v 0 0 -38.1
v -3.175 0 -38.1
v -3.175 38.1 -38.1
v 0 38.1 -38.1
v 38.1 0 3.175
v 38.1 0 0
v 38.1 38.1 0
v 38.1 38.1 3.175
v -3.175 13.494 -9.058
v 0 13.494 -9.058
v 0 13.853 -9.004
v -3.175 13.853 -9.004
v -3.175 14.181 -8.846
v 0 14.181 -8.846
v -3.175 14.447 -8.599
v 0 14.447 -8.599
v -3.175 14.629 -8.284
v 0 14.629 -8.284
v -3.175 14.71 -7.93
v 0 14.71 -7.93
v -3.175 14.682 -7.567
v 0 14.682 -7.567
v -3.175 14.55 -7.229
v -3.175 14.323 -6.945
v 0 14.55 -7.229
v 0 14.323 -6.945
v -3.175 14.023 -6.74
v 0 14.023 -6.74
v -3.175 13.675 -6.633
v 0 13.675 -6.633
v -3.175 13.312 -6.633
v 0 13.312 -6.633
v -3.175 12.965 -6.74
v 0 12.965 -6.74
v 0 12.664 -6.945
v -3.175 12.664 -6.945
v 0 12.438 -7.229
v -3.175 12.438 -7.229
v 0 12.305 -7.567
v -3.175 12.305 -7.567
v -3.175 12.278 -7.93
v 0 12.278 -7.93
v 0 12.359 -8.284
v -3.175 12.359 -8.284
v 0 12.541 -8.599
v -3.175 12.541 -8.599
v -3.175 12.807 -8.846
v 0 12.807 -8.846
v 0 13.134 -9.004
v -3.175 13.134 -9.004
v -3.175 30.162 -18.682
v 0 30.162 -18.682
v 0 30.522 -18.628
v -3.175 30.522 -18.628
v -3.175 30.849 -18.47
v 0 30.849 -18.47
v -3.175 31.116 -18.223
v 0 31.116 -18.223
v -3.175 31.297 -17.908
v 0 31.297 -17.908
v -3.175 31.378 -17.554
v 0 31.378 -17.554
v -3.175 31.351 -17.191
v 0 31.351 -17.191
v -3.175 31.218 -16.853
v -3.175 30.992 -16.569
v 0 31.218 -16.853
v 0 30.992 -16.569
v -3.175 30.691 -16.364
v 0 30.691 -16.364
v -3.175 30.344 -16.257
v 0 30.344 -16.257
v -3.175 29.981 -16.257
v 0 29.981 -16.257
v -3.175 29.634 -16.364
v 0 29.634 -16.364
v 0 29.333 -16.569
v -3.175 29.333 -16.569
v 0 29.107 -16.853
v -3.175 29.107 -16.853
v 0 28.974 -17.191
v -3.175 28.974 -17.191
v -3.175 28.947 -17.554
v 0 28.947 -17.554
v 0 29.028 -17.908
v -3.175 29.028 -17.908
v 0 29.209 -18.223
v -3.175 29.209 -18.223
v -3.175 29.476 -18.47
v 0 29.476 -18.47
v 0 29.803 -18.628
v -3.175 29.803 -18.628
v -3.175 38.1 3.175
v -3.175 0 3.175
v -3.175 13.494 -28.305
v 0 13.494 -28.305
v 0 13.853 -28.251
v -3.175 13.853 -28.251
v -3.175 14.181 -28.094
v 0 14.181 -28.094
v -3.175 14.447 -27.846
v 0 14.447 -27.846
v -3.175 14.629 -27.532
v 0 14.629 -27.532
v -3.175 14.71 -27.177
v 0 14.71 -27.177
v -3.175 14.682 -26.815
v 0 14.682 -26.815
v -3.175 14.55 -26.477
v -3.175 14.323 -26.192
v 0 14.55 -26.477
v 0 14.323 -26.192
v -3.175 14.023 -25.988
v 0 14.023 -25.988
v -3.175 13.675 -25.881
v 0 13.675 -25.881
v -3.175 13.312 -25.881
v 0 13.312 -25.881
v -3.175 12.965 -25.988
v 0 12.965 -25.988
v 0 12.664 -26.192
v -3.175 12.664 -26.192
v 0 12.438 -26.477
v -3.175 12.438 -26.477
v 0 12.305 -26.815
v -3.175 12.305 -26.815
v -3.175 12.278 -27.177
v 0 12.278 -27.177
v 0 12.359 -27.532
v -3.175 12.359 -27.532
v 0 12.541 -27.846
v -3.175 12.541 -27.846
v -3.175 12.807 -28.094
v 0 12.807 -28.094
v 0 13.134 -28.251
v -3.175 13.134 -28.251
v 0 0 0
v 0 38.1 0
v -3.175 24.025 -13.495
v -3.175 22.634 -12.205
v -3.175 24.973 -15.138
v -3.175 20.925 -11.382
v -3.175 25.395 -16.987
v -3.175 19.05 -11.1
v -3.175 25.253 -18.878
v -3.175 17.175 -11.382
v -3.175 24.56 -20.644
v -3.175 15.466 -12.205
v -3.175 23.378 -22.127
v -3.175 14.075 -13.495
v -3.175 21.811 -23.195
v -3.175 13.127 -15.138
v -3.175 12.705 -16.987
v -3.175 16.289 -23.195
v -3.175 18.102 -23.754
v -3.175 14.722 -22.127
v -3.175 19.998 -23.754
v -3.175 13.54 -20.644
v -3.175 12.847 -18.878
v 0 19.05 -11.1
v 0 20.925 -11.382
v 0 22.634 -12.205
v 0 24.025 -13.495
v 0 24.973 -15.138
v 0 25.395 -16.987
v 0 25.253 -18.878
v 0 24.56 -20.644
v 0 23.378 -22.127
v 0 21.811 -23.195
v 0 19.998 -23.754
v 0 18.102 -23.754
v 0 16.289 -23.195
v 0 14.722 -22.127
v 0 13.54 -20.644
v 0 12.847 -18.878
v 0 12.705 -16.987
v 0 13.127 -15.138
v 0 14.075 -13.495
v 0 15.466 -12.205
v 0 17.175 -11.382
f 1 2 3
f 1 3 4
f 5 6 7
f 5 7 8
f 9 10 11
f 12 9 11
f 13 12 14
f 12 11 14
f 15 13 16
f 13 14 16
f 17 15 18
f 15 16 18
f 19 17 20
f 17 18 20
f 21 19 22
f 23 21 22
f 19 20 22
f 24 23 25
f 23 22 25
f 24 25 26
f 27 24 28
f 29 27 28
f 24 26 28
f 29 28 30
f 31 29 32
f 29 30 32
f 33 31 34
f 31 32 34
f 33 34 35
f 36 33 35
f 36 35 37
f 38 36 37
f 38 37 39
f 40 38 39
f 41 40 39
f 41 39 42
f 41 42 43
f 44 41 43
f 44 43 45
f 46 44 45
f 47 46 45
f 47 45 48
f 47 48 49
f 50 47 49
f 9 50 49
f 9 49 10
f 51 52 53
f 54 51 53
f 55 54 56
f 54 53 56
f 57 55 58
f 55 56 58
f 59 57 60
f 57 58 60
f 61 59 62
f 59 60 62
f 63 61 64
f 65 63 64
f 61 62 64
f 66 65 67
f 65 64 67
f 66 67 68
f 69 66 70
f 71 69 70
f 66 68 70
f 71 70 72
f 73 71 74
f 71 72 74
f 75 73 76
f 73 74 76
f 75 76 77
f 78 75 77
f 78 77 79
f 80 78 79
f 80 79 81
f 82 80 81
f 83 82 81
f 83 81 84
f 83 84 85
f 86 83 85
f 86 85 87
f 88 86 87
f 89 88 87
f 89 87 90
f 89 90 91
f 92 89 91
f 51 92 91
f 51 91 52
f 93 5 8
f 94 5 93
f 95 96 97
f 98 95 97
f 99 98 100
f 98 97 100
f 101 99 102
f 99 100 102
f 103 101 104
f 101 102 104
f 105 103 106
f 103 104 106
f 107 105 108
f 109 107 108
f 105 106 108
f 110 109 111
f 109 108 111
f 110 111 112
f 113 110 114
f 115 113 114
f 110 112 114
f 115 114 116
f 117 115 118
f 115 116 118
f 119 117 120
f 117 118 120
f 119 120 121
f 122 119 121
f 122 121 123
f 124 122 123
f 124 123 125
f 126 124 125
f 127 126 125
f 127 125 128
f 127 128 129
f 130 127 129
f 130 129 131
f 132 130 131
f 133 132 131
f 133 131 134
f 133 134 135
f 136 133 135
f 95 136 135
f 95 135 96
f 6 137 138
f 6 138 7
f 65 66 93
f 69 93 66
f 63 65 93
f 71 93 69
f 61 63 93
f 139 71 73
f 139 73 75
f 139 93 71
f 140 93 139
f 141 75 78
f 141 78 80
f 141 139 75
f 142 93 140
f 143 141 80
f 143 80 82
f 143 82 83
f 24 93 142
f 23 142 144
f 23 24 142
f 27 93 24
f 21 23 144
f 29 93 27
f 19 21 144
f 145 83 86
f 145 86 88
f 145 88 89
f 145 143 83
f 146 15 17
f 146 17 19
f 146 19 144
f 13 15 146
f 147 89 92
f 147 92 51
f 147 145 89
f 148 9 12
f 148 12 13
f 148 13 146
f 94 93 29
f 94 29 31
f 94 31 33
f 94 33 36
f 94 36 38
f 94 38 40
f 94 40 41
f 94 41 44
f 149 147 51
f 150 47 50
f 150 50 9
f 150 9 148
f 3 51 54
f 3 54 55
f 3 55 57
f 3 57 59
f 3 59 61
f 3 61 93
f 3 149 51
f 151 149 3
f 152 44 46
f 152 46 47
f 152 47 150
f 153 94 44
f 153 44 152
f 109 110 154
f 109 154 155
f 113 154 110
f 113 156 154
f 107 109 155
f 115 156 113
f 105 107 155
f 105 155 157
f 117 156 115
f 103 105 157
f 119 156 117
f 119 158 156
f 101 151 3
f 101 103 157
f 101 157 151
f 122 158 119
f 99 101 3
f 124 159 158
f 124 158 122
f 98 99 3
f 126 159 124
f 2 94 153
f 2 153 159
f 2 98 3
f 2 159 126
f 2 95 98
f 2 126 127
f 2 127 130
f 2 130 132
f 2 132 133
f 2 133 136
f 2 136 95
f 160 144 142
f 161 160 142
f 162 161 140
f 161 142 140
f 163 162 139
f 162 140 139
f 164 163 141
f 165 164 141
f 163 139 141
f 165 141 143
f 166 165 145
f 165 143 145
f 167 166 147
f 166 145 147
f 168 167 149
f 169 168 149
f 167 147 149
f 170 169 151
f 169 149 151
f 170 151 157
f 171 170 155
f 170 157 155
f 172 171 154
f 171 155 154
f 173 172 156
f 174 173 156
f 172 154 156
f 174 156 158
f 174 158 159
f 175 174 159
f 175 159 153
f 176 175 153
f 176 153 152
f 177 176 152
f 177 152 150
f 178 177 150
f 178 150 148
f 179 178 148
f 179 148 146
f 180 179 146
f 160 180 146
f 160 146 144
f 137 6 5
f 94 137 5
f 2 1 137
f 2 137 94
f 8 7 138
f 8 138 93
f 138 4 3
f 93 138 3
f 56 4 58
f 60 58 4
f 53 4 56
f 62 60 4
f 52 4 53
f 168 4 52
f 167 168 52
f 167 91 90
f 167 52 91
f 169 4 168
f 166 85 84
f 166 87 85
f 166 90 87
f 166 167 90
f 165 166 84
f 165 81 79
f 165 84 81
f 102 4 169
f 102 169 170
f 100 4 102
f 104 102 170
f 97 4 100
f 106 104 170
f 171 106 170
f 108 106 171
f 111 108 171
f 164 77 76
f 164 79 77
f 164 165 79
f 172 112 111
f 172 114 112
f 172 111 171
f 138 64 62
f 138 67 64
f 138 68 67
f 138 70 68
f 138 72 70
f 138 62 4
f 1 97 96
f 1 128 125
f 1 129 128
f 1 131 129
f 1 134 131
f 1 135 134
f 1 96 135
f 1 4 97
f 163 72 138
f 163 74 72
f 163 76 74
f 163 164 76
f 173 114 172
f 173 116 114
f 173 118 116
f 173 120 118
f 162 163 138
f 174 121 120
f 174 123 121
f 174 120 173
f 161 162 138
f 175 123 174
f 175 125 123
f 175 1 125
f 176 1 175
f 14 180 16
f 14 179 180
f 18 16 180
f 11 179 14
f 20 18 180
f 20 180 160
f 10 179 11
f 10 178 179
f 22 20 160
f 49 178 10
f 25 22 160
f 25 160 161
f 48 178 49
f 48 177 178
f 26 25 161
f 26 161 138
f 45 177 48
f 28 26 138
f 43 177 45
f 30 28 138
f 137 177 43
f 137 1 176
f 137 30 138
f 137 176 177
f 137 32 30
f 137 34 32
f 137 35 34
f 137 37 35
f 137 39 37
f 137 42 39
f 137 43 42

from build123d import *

# Parameters (mm, degrees)
EXTRUDE_THIN1_DEPTH   = 38.1
SKETCH2_R             = 6.3627
CUT_EXTRUDE1_DEPTH    = 68.873747686
F_2_CLEARANCE_HOLE1_D = 2.4384


with BuildPart() as part:
    # Sketch1 → Extrude-Thin1 (new body)
    with BuildSketch(Plane(origin=(0, 0, 0), x_dir=(1, 0, 0), z_dir=(0, 1, 0))):
        Polygon((0, 38.1), (0, 0), (38.1, 0), (38.1, -3.175), (-3.175, -3.175), (-3.175, 38.1), align=None)
    extrude(amount=EXTRUDE_THIN1_DEPTH)

    # Sketch2 → Cut-Extrude1 (cut, through all)
    with BuildSketch(Plane.ZY.offset(3.175)):
        with Locations((-17.4625, 19.05)):
            Circle(SKETCH2_R)
    extrude(amount=-CUT_EXTRUDE1_DEPTH, mode=Mode.SUBTRACT)

    # #2 Clearance Hole1 (through all)
    with Locations(Plane.ZY.offset(3.175)):
        with Locations((-27.0862073, 13.49375), (-17.4625, 30.1625), (-7.8387927, 13.49375)):
            Hole(F_2_CLEARANCE_HOLE1_D / 2)


solid = part.part
